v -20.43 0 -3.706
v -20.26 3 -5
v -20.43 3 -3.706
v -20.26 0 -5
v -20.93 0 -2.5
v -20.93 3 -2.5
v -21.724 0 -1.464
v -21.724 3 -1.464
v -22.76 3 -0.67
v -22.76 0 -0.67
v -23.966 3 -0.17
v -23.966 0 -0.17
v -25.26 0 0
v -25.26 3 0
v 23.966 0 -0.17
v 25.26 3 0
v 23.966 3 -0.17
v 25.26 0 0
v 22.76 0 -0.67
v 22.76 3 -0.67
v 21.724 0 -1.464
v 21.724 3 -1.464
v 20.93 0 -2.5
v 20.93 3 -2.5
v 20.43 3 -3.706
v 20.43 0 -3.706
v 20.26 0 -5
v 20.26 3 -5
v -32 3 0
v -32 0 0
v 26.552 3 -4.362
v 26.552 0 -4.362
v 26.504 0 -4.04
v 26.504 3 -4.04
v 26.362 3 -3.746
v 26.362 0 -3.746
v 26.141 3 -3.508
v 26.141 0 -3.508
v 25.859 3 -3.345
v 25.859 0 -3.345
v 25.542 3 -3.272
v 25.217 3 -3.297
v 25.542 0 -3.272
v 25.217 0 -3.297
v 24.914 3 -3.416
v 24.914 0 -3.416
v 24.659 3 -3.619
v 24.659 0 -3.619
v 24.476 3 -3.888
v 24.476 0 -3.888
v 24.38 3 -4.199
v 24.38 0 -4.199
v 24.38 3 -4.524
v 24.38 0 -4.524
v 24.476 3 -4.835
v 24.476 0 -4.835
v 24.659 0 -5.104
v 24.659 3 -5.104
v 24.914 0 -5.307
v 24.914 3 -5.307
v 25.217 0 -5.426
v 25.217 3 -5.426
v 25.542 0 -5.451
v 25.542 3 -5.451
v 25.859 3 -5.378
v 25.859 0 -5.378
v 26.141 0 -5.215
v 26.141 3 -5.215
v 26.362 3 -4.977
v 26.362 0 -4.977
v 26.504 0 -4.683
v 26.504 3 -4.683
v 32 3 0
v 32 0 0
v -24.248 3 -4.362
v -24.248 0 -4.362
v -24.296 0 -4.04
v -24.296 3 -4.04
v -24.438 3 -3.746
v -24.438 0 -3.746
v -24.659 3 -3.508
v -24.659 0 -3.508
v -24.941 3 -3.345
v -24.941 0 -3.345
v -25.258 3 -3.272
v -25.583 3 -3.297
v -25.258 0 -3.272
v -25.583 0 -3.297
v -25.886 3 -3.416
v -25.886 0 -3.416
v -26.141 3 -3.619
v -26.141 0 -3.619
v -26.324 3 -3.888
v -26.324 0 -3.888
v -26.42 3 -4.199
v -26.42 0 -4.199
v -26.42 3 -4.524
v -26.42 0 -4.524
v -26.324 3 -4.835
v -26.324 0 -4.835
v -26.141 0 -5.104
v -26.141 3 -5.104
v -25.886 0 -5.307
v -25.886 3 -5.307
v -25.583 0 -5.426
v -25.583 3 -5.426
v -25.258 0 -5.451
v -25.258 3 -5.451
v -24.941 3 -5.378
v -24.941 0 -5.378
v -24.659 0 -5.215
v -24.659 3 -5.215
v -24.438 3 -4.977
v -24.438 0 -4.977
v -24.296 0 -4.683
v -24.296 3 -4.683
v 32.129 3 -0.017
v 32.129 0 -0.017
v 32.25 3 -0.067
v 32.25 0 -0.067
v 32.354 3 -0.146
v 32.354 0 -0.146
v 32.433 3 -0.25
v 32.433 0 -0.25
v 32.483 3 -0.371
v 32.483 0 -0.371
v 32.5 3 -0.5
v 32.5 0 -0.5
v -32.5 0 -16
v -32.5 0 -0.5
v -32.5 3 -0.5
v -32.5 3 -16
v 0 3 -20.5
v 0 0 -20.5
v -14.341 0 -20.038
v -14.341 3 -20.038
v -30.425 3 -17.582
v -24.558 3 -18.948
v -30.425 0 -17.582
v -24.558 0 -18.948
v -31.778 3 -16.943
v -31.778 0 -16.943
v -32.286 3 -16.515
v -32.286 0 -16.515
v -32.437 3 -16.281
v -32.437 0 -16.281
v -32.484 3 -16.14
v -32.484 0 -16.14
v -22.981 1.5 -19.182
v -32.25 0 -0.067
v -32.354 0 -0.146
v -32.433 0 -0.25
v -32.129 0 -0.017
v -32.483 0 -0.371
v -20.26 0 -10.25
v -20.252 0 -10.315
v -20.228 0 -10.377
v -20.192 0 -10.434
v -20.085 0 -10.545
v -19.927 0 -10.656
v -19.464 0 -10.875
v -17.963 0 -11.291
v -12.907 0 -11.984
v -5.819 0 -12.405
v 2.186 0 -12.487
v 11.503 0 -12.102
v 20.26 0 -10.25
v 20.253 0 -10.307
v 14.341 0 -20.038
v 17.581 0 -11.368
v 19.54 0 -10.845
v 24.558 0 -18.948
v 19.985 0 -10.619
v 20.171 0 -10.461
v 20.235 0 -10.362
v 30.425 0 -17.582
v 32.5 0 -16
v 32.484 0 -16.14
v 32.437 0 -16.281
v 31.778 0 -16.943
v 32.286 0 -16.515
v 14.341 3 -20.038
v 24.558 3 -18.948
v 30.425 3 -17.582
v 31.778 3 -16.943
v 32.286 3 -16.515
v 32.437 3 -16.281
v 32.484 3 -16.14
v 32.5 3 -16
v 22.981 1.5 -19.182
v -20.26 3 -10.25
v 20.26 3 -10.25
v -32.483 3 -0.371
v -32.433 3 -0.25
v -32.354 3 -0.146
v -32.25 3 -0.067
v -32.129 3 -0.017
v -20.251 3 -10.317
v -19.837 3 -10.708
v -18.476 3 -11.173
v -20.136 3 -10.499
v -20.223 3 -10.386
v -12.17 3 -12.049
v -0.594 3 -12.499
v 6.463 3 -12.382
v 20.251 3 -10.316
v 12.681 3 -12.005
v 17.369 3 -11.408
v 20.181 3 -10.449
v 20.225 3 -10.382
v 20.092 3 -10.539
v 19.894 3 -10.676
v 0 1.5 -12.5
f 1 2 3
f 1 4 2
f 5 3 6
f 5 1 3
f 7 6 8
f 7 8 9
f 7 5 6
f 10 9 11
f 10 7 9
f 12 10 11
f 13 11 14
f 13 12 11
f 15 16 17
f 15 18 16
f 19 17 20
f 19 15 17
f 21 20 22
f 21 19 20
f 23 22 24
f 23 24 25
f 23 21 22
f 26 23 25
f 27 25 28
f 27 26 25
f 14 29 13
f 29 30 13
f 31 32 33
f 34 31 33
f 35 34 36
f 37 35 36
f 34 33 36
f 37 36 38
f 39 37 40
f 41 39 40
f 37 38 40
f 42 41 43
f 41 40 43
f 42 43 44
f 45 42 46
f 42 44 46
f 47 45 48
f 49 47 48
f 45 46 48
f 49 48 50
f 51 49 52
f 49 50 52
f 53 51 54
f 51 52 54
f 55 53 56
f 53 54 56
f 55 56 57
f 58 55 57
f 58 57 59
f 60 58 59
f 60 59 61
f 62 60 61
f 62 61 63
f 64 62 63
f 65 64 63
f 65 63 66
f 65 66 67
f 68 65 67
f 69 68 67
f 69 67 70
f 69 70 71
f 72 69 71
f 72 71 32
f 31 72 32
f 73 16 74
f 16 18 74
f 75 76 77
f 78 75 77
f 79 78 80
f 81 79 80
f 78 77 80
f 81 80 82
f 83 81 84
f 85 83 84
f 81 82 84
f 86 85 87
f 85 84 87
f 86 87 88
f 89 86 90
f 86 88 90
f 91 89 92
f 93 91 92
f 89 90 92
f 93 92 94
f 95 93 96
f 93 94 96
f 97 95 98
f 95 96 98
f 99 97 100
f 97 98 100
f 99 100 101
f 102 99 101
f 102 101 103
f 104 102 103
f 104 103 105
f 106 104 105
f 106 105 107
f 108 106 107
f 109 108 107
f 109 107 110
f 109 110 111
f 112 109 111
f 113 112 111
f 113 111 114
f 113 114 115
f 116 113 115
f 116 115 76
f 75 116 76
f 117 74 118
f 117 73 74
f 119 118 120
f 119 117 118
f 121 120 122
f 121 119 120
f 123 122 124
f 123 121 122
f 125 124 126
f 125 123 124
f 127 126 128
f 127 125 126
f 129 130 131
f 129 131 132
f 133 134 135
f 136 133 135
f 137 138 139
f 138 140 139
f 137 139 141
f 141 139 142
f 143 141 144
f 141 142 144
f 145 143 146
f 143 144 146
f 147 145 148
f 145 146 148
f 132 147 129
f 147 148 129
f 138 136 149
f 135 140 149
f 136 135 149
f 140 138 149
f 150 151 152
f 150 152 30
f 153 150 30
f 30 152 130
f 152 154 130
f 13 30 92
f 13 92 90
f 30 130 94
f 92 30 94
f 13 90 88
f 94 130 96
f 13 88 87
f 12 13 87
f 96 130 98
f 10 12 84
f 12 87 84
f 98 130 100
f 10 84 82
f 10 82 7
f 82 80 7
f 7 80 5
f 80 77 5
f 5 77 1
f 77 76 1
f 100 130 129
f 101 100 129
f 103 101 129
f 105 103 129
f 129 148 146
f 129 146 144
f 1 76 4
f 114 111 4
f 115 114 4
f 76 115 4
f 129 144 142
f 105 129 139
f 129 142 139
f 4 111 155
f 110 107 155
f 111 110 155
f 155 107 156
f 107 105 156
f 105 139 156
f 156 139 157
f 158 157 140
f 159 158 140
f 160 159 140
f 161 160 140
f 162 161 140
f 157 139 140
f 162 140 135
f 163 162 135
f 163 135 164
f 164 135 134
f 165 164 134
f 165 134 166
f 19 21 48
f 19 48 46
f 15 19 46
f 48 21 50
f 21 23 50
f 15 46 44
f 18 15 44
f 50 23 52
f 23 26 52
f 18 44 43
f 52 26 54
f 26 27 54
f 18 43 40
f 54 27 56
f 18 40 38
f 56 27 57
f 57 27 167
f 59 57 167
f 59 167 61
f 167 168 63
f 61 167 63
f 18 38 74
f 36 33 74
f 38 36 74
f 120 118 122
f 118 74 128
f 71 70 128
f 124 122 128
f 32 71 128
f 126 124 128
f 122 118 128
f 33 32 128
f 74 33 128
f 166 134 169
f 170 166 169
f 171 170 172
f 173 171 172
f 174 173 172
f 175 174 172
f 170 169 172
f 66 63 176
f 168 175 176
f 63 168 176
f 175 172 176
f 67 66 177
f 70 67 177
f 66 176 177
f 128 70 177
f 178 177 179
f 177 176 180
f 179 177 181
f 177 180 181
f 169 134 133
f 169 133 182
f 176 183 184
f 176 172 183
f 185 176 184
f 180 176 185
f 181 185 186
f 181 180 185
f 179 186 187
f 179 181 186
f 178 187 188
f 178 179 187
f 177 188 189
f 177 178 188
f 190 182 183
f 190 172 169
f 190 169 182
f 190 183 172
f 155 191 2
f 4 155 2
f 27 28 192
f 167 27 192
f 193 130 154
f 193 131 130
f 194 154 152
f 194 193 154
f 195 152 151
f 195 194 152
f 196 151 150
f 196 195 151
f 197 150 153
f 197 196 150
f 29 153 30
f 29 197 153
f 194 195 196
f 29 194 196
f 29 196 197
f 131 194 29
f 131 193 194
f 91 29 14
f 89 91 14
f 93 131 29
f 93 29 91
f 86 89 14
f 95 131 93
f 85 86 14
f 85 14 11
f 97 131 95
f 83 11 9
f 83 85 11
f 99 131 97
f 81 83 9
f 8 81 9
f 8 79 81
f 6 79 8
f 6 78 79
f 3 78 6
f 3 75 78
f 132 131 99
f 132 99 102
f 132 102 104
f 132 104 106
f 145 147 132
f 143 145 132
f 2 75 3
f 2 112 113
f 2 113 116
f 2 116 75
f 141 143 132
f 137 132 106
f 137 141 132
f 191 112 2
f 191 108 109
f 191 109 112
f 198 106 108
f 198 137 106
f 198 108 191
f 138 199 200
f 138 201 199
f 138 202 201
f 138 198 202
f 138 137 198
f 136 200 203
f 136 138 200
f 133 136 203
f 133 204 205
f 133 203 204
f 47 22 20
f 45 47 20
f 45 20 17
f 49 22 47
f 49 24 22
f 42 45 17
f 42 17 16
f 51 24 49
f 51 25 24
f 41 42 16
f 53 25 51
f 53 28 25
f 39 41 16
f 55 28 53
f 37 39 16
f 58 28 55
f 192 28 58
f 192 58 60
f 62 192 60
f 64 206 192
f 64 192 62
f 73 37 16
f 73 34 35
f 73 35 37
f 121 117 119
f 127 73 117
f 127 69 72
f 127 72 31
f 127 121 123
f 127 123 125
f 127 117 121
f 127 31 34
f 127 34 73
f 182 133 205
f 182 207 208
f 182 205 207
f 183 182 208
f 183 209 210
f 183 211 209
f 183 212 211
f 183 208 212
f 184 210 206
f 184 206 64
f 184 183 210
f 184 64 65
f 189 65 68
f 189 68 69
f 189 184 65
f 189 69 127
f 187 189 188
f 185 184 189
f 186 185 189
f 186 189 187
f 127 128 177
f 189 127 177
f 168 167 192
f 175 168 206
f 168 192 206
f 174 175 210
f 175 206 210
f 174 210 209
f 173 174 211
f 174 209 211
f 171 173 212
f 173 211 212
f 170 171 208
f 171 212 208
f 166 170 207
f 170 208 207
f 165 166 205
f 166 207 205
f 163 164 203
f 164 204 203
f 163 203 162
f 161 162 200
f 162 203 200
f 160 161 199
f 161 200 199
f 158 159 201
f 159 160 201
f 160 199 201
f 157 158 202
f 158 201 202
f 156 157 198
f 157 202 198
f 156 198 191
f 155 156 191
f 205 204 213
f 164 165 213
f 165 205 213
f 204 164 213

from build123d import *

# Parameters (mm, degrees)
BOSS_EXTRUDE1_DEPTH = 3
CUT_EXTRUDE1_DEPTH  = 4.0000001
SKETCH3_R           = 1.0922
CUT_EXTRUDE2_DEPTH  = 4.0000001
FILLET1_R           = 5
FILLET2_R           = 0.5


with BuildPart() as part:
    # Sketch1 → Boss-Extrude1 (new body)
    with BuildSketch(Plane(origin=(0, 0, 0), x_dir=(1, 0, 0), z_dir=(0, 1, 0))):
        with BuildLine():
            Line((0, 0), (-32.5, 0))
            Line((-32.5, 0), (-32.5, 16))
            add(Edge.make_bspline(
                [(0, 20.5), (-32.5, 20.5), (-32.5, 16)],
                knots=[4.71238898, 4.71238898, 4.71238898, 6.283185307, 6.283185307, 6.283185307], degree=2, weights=[1, 0.707106781, 1]))
            Line((0, 20.5), (0, 16))
            Line((0, 16), (0, 0))
        make_face()
    boss_extrude1 = extrude(amount=BOSS_EXTRUDE1_DEPTH)

    # Mirror1: Boss-Extrude1 across plane
    add(boss_extrude1.mirror(Plane(origin=(0, 3, -16), x_dir=(0, 0, 1), z_dir=(-1, 0, 0))))

    # Sketch2 → Cut-Extrude1 (cut, through all)
    with BuildSketch(Plane(origin=(0, 3, 0), x_dir=(1, 0, 0), z_dir=(0, 1, 0))):
        with BuildLine():
            Line((0, 10.25), (0, 12.5))
            add(Edge.make_bspline(
                [(0, 12.5), (-20.26, 12.5), (-20.26, 10.25)],
                knots=[4.71238898, 4.71238898, 4.71238898, 6.283185307, 6.283185307, 6.283185307], degree=2, weights=[1, 0.707106781, 1]))
            Line((-20.26, 10.25), (-20.26, 0))
            Line((-20.26, 0), (0, 0))
            Line((0, 0), (0, 10.25))
        make_face()
        with BuildLine():
            Line((20.26, 0), (20.26, 10.25))
            add(Edge.make_bspline(
                [(20.26, 10.25), (20.26, 12.5), (0, 12.5)],
                knots=[3.141592654, 3.141592654, 3.141592654, 4.71238898, 4.71238898, 4.71238898], degree=2, weights=[1, 0.707106781, 1]))
            Line((0, 12.5), (0, 10.25))
            Line((0, 10.25), (0, 0))
            Line((0, 0), (20.26, 0))
        make_face()
    extrude(amount=-CUT_EXTRUDE1_DEPTH, mode=Mode.SUBTRACT)

    # Sketch3 → Cut-Extrude2 (cut, through all)
    with BuildSketch(Plane.XZ):
        with Locations((25.46, -4.3615)):
            Circle(SKETCH3_R)
        with Locations((-25.34, -4.3615)):
            Circle(SKETCH3_R)
    extrude(amount=-CUT_EXTRUDE2_DEPTH, mode=Mode.SUBTRACT)

    # Fillet1
    fillet1_edges = [part.edges().sort_by_distance(p)[0] for p in [
        (20.26, 1.5, 0),
        (-20.26, 1.5, 0),
    ]]
    fillet(fillet1_edges, radius=FILLET1_R)

    # Fillet2
    fillet2_edges = [part.edges().sort_by_distance(p)[0] for p in [
        (32.5, 1.5, 0),
        (-32.5, 1.5, 0),
    ]]
    fillet(fillet2_edges, radius=FILLET2_R)


solid = part.part
